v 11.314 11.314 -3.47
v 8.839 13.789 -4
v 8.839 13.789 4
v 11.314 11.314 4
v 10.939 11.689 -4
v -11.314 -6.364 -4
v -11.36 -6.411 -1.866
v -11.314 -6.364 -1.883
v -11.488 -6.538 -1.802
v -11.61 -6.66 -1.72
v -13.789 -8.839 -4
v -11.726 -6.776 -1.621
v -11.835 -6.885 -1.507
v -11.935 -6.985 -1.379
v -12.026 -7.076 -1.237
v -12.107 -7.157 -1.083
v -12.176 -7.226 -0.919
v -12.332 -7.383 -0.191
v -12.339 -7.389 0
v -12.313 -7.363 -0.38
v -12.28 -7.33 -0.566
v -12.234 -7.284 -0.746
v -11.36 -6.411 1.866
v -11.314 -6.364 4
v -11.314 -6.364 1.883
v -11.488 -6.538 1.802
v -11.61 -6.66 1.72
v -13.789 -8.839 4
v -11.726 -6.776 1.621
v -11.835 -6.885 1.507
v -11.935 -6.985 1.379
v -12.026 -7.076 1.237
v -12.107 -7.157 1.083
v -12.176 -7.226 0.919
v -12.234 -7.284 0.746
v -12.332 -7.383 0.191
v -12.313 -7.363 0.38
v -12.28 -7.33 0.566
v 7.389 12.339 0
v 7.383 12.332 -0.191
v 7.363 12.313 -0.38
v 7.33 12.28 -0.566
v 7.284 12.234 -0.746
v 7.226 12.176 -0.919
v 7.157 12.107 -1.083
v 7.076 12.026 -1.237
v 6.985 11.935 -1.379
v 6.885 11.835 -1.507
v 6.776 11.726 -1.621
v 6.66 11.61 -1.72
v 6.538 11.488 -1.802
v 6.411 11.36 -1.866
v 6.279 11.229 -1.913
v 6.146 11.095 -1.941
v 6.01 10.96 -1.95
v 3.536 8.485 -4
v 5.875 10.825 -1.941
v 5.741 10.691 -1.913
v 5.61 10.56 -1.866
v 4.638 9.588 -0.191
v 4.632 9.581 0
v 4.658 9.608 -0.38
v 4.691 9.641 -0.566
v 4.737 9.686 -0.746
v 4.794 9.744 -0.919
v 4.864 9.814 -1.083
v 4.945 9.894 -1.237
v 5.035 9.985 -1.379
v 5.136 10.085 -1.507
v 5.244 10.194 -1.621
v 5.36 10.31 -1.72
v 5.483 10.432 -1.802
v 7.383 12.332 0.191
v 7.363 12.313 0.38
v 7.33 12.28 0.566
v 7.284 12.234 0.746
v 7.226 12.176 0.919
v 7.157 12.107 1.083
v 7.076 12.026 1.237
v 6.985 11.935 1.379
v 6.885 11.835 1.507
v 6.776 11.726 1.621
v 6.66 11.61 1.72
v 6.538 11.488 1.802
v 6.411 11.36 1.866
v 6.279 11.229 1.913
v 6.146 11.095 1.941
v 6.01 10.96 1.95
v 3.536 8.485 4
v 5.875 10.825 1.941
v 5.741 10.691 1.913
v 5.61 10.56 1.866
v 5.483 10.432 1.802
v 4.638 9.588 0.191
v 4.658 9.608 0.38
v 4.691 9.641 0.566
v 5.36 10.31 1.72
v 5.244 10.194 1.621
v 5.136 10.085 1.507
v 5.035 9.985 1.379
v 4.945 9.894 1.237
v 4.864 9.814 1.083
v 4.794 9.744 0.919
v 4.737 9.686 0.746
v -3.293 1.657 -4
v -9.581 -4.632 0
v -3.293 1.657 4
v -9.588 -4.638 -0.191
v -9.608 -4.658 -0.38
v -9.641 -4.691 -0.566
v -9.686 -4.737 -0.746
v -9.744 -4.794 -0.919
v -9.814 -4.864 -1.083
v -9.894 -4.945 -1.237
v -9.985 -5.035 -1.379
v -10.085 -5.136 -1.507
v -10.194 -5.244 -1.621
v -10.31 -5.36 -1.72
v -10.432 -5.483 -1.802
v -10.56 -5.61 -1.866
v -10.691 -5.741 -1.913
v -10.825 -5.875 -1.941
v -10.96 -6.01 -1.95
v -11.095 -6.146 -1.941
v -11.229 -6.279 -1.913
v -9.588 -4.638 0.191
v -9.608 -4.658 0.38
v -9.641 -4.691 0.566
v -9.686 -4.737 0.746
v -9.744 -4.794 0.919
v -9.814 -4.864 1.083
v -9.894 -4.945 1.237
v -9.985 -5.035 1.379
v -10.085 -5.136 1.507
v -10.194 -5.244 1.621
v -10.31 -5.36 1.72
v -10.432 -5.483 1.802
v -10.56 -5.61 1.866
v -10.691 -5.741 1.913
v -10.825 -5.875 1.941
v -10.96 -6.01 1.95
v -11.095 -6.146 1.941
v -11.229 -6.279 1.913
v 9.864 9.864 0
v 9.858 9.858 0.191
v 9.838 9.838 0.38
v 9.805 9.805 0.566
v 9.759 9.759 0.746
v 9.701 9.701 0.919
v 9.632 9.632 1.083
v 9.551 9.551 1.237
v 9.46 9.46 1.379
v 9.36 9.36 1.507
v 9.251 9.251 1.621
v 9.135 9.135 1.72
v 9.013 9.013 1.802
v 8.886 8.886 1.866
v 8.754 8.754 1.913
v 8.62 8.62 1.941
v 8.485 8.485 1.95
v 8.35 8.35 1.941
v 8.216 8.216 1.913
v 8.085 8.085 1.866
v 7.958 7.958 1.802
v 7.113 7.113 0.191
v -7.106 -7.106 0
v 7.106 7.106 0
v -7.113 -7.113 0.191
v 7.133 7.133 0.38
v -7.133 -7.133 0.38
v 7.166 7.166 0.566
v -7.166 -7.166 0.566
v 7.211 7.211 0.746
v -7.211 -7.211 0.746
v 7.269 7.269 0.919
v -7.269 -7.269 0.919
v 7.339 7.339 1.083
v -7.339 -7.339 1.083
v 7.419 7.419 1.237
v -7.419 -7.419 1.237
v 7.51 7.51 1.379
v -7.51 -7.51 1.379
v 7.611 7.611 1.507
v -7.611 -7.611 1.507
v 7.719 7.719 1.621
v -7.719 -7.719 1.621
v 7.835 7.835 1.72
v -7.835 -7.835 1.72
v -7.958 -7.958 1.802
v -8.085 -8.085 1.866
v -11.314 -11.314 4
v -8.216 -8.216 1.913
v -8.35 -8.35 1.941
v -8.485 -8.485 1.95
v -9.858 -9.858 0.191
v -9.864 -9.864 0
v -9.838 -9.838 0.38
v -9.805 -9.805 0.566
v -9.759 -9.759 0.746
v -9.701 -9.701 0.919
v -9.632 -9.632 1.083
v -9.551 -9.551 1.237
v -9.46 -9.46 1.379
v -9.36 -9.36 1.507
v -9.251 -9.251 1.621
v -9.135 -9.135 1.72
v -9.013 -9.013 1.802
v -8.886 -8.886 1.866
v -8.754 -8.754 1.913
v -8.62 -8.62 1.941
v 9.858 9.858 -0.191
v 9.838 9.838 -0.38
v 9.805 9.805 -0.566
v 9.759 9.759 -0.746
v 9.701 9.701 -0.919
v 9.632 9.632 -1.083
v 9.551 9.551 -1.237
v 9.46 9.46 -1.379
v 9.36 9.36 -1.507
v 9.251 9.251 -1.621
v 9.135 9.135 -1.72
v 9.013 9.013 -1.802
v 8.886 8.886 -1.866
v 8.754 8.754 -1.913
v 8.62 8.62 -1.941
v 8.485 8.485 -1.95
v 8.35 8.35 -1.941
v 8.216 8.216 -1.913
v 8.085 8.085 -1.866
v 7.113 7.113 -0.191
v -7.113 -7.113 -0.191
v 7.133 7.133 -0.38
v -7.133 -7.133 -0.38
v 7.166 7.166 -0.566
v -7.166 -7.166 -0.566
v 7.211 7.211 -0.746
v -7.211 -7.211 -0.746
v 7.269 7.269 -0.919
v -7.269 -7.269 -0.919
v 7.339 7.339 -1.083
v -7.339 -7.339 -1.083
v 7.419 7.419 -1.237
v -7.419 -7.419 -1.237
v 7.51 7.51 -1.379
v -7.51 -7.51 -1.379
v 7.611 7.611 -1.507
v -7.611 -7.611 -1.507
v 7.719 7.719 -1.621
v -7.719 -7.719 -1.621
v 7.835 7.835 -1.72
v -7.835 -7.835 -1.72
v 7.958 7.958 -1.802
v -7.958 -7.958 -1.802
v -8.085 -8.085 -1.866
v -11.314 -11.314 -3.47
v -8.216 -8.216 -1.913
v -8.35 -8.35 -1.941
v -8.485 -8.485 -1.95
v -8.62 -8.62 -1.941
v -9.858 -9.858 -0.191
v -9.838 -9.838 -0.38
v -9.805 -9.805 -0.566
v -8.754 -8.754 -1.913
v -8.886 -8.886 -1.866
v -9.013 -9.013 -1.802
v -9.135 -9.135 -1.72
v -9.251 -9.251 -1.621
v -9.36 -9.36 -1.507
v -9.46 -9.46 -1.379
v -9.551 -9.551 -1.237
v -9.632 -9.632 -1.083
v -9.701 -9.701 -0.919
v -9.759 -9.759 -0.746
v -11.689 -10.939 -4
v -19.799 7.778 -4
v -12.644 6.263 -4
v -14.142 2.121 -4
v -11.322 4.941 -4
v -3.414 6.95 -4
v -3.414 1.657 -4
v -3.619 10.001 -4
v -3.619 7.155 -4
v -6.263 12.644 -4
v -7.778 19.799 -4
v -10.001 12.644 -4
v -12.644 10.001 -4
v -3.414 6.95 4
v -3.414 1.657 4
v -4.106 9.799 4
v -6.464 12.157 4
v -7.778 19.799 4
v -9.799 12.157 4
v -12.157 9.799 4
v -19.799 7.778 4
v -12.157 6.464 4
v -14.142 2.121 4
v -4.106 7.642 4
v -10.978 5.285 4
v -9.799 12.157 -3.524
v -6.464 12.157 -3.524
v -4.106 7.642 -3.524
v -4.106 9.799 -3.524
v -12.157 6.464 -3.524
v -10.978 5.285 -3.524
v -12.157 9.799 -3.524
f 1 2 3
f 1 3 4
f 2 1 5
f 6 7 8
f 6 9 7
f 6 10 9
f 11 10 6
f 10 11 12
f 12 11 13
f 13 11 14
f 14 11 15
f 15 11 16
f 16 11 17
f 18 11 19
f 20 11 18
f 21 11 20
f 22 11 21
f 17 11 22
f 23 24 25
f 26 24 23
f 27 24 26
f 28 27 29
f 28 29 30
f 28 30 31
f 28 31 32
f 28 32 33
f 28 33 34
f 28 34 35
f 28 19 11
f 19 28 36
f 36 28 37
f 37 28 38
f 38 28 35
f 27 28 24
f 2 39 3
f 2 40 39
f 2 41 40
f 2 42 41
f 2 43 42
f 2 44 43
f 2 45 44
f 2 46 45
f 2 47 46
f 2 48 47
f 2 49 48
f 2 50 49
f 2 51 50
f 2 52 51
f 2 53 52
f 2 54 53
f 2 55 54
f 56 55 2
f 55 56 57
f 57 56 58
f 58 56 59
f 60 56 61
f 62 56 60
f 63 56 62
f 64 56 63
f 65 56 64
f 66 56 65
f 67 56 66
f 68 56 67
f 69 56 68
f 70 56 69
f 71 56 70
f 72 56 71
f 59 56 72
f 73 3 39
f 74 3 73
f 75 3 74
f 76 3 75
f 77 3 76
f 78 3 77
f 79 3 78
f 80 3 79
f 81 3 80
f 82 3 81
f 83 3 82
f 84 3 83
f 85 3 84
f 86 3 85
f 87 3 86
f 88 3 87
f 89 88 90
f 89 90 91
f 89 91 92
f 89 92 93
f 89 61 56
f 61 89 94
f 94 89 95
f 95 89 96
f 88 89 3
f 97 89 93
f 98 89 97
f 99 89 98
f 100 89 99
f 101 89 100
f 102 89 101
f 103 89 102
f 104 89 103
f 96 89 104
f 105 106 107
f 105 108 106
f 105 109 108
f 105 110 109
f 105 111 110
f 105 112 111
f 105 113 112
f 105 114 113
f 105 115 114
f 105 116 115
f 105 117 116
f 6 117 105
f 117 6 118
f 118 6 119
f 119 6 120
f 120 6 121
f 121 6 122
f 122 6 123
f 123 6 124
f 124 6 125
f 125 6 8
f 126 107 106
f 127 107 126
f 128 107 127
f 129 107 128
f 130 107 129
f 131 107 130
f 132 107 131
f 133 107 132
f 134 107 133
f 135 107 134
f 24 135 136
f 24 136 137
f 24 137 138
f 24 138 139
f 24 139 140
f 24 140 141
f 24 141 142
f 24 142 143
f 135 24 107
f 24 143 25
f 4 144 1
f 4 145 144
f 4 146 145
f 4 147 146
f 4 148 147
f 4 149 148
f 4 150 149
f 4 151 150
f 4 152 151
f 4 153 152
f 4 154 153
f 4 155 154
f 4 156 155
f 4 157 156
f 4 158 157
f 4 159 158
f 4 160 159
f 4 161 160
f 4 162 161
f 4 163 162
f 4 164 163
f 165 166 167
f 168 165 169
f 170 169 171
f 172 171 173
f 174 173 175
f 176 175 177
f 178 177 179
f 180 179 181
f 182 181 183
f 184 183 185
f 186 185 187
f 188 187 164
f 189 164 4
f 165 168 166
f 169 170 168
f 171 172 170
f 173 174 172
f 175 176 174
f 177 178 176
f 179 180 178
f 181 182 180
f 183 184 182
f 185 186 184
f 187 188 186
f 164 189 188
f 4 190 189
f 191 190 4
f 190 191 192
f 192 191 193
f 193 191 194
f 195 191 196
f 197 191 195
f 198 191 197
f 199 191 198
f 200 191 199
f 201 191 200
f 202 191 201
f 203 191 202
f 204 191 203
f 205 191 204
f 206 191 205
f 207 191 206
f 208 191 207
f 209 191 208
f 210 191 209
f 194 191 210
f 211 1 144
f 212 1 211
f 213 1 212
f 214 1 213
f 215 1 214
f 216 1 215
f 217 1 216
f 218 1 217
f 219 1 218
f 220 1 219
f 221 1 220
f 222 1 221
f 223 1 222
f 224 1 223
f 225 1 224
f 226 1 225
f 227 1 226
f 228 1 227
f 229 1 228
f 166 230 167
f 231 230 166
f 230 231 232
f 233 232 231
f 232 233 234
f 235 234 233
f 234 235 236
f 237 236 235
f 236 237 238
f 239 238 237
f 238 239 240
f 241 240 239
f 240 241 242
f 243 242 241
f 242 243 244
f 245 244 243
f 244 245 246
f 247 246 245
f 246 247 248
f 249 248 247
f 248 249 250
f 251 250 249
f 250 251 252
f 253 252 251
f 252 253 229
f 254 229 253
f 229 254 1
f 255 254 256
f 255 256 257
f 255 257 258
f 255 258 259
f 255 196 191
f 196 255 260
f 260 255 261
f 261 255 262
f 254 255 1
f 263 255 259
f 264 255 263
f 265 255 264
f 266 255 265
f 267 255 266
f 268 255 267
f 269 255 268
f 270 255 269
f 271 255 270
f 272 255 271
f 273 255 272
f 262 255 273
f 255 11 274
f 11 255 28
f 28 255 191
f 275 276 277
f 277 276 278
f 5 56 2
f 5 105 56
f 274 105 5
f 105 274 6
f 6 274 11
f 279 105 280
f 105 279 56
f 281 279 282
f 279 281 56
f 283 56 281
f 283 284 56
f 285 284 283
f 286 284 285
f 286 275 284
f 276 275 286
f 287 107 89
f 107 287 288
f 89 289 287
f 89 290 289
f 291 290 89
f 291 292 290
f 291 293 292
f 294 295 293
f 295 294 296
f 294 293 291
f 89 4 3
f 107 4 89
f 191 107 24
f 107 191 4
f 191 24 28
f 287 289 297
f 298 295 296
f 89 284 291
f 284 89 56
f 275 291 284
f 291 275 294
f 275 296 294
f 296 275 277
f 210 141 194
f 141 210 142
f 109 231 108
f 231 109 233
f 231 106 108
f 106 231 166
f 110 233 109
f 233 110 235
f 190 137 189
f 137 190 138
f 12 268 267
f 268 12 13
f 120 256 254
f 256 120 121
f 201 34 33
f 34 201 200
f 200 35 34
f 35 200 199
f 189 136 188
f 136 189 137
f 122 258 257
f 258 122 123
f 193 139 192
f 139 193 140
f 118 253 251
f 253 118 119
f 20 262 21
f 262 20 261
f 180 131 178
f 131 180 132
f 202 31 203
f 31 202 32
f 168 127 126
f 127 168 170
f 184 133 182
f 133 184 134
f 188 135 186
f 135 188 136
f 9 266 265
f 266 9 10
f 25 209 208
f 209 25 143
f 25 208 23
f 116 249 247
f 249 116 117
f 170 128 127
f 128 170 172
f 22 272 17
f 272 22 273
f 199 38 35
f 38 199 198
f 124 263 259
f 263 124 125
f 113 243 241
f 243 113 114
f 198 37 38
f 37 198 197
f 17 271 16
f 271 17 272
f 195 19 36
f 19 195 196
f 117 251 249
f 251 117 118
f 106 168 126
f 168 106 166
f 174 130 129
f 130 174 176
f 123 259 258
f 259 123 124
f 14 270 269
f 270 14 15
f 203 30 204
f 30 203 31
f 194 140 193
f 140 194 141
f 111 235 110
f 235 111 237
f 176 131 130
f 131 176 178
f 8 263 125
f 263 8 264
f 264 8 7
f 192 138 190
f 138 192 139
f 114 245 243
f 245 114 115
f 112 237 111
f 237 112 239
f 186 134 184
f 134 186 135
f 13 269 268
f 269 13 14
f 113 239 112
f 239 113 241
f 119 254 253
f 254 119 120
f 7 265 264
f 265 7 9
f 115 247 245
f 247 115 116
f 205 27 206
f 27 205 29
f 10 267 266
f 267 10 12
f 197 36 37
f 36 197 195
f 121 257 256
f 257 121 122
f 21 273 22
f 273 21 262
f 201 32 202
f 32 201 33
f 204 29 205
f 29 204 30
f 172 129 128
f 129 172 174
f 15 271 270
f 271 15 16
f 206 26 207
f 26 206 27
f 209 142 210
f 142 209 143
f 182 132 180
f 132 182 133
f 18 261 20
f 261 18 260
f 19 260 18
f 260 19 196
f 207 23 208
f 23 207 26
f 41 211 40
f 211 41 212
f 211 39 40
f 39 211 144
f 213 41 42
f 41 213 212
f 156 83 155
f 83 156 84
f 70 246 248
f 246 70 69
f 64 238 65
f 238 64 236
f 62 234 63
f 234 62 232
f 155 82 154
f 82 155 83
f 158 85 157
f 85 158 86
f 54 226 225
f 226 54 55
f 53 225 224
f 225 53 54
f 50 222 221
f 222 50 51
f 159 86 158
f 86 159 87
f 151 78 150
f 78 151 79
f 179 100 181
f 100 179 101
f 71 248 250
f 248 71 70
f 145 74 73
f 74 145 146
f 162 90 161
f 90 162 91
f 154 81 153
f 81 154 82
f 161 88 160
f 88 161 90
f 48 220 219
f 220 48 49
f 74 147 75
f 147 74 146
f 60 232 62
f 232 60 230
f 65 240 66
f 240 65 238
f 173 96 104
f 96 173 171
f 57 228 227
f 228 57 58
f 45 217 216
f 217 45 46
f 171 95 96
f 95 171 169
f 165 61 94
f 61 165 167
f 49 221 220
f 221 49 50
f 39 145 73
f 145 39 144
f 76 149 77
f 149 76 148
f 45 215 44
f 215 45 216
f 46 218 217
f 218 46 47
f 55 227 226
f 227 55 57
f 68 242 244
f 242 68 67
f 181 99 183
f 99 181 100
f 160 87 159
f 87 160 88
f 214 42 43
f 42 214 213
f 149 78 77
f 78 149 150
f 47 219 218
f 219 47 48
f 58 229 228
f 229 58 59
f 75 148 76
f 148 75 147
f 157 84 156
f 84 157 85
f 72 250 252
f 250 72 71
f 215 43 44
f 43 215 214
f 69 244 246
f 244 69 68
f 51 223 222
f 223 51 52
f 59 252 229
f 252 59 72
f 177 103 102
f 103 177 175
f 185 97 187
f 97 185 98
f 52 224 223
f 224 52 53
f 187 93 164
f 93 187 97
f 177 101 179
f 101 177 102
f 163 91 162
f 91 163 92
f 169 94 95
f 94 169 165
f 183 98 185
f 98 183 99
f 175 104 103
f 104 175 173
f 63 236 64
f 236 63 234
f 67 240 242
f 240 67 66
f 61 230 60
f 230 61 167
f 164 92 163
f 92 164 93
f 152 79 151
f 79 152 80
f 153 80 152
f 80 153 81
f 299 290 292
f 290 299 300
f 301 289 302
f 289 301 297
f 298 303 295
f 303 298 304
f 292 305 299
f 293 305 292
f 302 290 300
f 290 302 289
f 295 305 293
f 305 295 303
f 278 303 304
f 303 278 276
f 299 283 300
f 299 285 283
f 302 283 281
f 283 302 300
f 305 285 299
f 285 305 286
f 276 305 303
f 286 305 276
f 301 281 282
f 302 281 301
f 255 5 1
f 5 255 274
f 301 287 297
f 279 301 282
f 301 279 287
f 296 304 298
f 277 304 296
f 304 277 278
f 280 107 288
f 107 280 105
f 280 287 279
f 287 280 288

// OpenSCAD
//Customizable Clip On Bushing and Carriage Mount, by ggroloff 9.18.2018

//Use this to make a model for a bushing/housing all in one that just clips around the guide rods. That way you can take off your carriages without removing the guide rods.
//I had better results (tighter tolerance with less friction) by using thin 8 mm bushings over the convention of using 24 mm bushings. YMMV, but I'm really happy with their performance.


//sets rod position from carriage, default 11.5
rod_position = 11.5;

//sets rod diameter for bushing, default 8.05
rod_diameter = 8.05;

//sets the length of the bushing
bushing_length= 8;

//sets the width of the mount plate
mount_width = 32;

//sets the diameter of the screw holes in the mount plate
mount_diameter = 3.9;

//sets the coordinates of the mount points, [x,y,z], leave z at 0. Set coordinates outside of the model volume [100,0,0] if not being used
mount1 = [-12,0,0];
mount2 = [12,0,0];
mount3 = [100,0,0];
mount4 = [100,0,0];

/*[Hidden}*/
//code starts here

module body() {
translate([0,0,1.75]) cube ([mount_width,bushing_length,3.5], center=true);
translate([0,0,(rod_position+8)/2]) cube ([17,bushing_length,rod_position+8], center=true);
}

module mount_points() {
 translate  (mount1) cylinder(d= mount_diameter, h = 30, center = true, $fn =64);
 translate  (mount2) cylinder(d= mount_diameter, h = 30, center = true, $fn =64);
 translate  (mount3) cylinder(d= mount_diameter, h = 30, center = true, $fn =64);
 translate  (mount4) cylinder(d= mount_diameter, h = 30, center = true, $fn =64);
}

module rod() {
        cylinder (d=1.0825*rod_diameter,h=50,center=true,$fn=8);//render octagon of rod_diameter width
}


//rod();

rotate ([-90,0,45]) //positions model for print

{
difference() {    
    body();//render body
    mount_points();//drill out mount screws
    translate ([0,0,rod_position]) rotate ([90,22.5,0]) rod();//drill out rod
    translate ([0,bushing_length/2,rod_position]) rotate ([90,22.5,0]) cylinder (r2=1.0825*4,r1=1.0825*4.1+1,h=1,center=true,$fn=8);//drill out rod chamfer
    translate ([0,bushing_length/2,0]) rotate ([45,0,0]) cube ([33,.75,.75], center = true);//drill out base chamfer
    translate ([-5,-.005,7.5]) rotate ([0,0,0]) cube([15,bushing_length+.01,8], center=true);//drill out rod slot
}
translate ([3,0,5]) rotate ([0,45,0]) cube ([4,bushing_length,8],center=true);//add ramp
}
